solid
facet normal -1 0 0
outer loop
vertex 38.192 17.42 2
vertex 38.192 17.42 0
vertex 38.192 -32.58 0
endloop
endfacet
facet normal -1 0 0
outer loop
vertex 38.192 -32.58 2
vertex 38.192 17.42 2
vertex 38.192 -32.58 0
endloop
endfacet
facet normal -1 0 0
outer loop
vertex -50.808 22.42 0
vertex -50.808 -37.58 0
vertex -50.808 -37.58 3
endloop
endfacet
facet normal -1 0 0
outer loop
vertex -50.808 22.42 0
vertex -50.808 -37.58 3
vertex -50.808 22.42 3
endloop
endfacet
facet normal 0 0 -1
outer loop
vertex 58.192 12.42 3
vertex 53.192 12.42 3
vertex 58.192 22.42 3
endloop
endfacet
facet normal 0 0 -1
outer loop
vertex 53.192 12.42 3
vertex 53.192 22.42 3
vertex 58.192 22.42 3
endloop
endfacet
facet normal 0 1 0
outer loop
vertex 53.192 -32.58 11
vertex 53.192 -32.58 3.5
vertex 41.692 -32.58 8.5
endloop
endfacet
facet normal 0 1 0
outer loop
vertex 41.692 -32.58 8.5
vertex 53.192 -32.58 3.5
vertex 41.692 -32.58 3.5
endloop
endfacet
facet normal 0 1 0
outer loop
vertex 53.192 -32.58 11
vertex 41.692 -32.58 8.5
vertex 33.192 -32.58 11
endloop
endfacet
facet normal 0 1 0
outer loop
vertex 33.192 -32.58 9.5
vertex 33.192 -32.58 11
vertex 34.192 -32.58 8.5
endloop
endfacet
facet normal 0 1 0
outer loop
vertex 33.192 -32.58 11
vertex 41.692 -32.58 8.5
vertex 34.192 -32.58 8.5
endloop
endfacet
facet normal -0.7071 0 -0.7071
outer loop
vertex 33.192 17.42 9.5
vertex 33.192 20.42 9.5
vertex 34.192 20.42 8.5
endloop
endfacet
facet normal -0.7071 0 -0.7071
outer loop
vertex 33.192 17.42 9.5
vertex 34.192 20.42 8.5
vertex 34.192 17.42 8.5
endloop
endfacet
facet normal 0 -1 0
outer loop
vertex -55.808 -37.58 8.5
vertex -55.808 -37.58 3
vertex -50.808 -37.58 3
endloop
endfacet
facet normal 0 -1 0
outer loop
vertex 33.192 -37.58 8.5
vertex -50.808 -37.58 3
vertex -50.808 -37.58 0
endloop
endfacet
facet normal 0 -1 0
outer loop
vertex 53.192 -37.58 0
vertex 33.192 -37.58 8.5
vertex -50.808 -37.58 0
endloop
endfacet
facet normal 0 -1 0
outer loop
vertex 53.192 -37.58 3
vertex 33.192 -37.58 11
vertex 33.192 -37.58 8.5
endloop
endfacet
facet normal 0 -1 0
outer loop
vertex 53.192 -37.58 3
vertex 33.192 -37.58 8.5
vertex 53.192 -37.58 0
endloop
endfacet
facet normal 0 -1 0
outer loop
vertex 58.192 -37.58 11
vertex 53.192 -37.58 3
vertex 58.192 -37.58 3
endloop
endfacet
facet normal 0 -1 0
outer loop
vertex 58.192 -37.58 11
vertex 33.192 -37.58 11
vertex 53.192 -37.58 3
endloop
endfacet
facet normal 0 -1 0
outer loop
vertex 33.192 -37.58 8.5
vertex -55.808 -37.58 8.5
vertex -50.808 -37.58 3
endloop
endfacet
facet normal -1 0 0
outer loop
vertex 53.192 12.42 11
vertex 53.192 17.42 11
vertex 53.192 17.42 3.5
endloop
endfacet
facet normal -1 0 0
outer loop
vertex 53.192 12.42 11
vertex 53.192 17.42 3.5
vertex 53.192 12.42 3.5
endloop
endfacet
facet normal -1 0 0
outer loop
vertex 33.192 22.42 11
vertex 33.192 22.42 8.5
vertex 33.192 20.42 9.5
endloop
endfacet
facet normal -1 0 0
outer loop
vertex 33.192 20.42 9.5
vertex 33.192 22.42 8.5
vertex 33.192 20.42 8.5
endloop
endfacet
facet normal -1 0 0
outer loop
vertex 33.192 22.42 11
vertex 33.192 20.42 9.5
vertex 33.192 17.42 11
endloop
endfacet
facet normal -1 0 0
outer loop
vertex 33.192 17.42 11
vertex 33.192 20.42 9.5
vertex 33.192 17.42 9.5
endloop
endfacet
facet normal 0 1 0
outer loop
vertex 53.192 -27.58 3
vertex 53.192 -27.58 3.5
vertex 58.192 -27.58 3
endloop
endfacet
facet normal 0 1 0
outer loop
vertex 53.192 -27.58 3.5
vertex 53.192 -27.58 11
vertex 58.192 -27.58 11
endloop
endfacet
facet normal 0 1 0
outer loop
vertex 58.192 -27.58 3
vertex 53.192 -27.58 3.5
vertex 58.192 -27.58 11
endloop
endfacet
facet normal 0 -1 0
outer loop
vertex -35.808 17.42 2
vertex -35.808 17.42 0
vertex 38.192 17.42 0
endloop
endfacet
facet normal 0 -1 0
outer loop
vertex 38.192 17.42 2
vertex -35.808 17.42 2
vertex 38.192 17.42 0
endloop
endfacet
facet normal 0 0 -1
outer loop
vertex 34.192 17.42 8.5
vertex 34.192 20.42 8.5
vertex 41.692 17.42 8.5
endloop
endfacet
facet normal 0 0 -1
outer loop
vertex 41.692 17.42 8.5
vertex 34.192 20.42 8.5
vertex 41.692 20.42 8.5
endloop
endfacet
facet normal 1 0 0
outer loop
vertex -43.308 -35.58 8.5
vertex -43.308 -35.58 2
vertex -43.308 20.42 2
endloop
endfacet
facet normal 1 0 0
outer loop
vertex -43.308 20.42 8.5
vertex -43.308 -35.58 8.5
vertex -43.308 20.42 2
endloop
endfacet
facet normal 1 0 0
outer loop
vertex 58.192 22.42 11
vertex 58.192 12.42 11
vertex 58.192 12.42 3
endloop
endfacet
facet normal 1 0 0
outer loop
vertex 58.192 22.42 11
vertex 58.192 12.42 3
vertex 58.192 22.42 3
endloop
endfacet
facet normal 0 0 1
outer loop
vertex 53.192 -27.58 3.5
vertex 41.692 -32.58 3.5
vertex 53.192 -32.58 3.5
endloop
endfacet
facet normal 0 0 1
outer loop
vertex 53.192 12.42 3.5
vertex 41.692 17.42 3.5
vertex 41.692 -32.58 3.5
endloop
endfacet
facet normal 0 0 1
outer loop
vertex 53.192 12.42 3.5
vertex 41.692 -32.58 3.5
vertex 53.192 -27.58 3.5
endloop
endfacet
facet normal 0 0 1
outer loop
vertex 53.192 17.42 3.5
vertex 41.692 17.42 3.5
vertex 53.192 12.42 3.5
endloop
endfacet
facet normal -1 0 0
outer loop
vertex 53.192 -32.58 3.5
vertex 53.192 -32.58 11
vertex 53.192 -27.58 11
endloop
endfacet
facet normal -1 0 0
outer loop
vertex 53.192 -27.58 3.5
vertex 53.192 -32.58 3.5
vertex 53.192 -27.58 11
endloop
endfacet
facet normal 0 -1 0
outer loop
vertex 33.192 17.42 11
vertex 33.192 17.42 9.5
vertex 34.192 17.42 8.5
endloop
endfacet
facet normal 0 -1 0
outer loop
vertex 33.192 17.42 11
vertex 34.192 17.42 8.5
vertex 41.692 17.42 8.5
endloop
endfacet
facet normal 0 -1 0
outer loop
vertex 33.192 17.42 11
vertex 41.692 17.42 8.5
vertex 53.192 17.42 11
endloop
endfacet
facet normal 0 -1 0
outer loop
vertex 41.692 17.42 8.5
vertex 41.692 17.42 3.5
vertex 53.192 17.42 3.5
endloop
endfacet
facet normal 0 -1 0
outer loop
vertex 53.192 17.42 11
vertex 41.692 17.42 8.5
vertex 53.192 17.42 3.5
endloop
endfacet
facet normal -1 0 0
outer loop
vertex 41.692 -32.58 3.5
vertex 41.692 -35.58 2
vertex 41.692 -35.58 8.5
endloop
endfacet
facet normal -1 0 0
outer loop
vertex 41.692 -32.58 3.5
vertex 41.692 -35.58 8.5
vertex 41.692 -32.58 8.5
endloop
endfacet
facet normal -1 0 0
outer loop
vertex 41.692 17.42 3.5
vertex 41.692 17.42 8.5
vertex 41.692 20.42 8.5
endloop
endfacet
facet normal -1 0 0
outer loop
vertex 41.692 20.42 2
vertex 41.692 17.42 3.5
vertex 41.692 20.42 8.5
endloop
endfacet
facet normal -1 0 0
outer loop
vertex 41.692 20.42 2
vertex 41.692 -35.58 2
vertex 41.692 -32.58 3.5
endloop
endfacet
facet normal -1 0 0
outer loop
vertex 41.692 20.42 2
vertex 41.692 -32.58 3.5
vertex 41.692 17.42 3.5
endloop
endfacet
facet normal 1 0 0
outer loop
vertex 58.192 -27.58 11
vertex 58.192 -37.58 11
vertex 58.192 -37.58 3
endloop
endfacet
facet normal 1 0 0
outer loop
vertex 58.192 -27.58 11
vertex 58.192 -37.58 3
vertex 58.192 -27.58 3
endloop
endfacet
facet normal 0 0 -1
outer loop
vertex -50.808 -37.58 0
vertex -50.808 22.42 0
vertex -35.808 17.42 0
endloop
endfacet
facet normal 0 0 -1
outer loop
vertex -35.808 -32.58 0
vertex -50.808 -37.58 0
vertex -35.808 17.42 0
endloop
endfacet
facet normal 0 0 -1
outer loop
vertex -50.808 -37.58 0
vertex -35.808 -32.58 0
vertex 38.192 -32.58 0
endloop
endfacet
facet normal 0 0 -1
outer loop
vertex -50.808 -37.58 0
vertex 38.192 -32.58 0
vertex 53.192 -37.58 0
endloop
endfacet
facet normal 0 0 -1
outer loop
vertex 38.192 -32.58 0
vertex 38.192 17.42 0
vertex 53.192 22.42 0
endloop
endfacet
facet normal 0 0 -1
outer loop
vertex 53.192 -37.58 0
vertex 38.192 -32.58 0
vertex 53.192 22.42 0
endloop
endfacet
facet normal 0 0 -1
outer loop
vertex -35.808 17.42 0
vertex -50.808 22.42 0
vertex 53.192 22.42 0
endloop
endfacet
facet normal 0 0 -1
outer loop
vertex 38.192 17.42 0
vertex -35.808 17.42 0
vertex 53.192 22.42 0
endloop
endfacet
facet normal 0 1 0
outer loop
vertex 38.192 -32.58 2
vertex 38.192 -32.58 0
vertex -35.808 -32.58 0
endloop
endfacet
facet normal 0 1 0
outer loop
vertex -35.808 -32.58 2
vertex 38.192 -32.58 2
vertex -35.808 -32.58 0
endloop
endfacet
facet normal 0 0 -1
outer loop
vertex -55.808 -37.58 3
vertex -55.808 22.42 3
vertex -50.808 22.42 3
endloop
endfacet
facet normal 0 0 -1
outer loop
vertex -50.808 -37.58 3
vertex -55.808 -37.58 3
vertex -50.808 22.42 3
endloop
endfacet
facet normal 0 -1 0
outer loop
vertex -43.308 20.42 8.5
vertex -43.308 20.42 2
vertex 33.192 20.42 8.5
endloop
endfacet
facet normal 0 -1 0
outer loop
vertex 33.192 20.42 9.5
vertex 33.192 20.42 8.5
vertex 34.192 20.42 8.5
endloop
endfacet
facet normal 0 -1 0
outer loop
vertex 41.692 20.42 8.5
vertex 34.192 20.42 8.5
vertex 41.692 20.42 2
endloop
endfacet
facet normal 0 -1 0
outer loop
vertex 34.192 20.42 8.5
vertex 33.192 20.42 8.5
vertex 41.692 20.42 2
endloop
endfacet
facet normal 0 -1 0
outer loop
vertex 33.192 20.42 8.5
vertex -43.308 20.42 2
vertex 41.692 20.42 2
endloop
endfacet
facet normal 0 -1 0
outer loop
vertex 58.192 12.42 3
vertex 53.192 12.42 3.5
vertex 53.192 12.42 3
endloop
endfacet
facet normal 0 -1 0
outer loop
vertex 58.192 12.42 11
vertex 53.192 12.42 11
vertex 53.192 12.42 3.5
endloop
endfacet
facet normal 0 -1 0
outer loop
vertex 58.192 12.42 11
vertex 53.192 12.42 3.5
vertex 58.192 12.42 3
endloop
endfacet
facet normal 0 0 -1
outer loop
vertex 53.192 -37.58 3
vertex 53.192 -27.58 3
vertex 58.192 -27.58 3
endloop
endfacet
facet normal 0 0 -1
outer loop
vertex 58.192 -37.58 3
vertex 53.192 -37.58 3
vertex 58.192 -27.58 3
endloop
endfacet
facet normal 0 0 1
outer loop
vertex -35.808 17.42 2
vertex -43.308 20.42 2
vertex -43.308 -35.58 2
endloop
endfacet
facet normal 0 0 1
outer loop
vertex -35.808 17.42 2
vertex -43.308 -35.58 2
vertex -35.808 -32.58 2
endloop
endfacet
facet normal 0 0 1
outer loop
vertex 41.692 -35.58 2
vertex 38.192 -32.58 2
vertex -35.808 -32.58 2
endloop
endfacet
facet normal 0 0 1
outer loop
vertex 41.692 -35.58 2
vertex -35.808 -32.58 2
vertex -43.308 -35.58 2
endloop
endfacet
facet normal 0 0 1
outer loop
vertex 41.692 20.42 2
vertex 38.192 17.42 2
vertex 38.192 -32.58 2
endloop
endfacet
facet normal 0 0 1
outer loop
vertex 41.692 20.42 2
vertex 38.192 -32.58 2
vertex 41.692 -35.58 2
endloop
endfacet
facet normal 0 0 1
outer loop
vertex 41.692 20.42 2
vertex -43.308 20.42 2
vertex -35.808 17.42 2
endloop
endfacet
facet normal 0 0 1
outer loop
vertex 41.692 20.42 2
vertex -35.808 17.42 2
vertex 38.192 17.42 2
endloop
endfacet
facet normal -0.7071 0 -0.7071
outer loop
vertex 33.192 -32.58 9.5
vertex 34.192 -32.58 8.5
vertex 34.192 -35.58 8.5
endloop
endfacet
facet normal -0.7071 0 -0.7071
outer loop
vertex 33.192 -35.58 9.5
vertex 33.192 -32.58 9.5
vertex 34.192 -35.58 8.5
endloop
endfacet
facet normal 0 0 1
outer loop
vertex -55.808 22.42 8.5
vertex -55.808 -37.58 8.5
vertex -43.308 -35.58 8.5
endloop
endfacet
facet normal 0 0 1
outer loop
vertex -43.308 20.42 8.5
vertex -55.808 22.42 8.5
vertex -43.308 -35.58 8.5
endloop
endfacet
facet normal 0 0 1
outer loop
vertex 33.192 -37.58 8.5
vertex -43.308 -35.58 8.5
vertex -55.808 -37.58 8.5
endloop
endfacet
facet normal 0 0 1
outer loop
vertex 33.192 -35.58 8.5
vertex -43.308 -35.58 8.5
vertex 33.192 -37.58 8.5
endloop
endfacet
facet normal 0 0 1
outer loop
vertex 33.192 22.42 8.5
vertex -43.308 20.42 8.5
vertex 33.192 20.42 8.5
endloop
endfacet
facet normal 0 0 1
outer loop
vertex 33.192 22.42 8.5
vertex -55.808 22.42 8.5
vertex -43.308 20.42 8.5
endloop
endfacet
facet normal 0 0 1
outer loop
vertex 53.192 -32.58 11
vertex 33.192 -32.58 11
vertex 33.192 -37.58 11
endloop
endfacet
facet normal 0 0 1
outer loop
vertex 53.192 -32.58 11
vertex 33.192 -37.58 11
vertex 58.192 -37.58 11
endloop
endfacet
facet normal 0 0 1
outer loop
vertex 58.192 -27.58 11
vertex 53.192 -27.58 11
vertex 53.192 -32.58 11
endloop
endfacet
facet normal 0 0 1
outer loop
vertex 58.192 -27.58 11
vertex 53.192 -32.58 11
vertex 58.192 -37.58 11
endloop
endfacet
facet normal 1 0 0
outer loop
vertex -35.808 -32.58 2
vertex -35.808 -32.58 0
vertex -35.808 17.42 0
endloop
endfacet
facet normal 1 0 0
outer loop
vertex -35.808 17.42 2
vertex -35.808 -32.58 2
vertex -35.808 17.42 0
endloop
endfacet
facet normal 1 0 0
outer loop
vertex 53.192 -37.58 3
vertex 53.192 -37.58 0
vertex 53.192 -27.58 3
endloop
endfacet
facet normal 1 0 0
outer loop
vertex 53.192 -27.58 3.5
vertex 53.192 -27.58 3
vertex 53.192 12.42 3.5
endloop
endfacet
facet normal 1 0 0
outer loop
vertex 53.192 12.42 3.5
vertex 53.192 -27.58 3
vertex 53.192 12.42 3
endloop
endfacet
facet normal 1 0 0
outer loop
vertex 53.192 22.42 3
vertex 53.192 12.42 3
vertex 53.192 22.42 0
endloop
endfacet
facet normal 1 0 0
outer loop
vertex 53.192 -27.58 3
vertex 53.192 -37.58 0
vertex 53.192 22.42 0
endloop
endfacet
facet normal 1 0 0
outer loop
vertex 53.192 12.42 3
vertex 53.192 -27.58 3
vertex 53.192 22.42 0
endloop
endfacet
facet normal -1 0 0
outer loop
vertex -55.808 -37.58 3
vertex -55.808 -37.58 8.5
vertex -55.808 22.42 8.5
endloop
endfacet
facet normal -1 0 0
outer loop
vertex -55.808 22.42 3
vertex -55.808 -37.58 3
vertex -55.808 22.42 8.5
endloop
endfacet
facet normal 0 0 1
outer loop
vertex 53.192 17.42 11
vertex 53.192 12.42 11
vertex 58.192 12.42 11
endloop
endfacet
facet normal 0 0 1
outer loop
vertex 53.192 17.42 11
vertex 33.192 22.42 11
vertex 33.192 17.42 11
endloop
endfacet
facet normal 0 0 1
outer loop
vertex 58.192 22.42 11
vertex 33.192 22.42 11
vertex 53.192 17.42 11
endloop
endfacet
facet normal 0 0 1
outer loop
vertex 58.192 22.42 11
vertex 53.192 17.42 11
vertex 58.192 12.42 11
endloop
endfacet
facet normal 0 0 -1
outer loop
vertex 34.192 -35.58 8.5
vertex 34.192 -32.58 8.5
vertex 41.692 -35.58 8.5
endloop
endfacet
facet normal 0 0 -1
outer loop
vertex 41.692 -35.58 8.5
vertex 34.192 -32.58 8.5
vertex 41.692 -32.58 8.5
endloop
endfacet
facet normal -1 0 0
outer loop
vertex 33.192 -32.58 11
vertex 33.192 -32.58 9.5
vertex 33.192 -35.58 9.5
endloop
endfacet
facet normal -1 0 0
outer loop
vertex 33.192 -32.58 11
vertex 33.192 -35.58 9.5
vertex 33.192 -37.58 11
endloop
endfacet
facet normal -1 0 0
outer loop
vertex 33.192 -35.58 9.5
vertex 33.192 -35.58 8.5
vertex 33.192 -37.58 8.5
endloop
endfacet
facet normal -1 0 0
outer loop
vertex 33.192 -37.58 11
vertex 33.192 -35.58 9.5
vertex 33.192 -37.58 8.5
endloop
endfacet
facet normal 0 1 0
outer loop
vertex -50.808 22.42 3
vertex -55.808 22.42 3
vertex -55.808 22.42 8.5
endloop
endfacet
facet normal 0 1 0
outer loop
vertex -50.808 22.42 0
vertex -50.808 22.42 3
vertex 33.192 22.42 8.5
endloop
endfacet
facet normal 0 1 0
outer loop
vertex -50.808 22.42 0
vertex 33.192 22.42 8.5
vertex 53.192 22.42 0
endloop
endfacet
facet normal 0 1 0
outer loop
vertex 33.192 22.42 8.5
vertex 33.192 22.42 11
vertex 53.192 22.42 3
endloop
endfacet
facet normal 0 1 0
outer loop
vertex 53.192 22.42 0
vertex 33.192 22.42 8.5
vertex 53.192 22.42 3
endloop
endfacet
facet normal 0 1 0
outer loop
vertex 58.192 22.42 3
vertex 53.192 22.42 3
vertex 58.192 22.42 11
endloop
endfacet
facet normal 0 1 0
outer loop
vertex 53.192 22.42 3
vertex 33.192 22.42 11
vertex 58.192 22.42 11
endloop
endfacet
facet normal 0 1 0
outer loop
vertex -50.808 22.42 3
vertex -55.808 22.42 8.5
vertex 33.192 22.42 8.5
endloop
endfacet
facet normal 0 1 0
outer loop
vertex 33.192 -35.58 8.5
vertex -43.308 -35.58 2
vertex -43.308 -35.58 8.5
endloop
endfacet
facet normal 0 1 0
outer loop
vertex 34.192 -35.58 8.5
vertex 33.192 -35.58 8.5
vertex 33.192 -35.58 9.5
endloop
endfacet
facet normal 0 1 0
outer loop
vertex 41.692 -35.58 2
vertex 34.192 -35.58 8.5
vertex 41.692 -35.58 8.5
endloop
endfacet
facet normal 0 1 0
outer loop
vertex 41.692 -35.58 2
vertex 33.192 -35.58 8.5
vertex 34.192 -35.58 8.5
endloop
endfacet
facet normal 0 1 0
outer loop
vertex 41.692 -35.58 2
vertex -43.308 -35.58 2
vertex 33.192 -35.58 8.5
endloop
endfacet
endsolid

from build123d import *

# Parameters (mm, degrees)
F0_W      = 104
F0_H      = 60
F0_W_2    = 85
F0_H_2    = 56
F1_DEPTH  = 8.5
F2_DEPTH  = 2
F3_W      = 8.5
F3_H      = 3
F4_DEPTH  = 2.5
F5_SIZE   = 1
F6_DEPTH  = 5
F7_W      = 5
F7_H      = 10
F8_DEPTH  = 8
F9_W      = 5
F9_H      = 60
F10_DEPTH = 5.5


with BuildPart() as f1:
    # F0 (on Top) → F1 (new body)
    with BuildSketch(Plane.XY):
        with Locations((1.1924776137, -7.5798341542)):
            Rectangle(F0_W, F0_H)
        with Locations((-0.8075223863, -7.5798341542)):
            Rectangle(F0_W_2, F0_H_2, mode=Mode.SUBTRACT)
    extrude(amount=F1_DEPTH)

    # F0 (on Top) → F2 (join)
    with BuildSketch(Plane.XY):
        with Locations((-0.8075223863, -7.5798341542)):
            Rectangle(F0_W_2, F0_H_2)
        Polygon((-35.8075223863, -32.5798341542), (-35.8075223863, 17.4201658458), (34.1924776137, 17.4201658458), (38.1924776137, 17.4201658458), (38.1924776137, -32.5798341542), align=None, mode=Mode.SUBTRACT)
    extrude(amount=F2_DEPTH)

    # F3 (on face) → F4 (join)
    with BuildSketch(Plane.XY.offset(8.5)):
        with Locations((37.4424776137, -34.0798341542)):
            Rectangle(F3_W, F3_H)
        with Locations((37.4424776137, 18.9201658458)):
            Rectangle(F3_W, F3_H)
        Polygon((33.1924776137, -37.5798341542), (53.1924776137, -37.5798341542), (53.1924776137, -32.5798341542), (41.6924776137, -32.5798341542), (41.6924776137, -35.5798341542), (33.1924776137, -35.5798341542), align=None)
        Polygon((41.6924776137, 17.4201658458), (53.1924776137, 17.4201658458), (53.1924776137, 22.4201658458), (33.1924776137, 22.4201658458), (33.1924776137, 20.4201658458), (41.6924776137, 20.4201658458), align=None)
    extrude(amount=F4_DEPTH)

    # F5
    f5_edges = [f1.edges().sort_by_distance(p)[0] for p in [
        (33.192478, 18.920166, 8.5),
        (33.192478, -34.079834, 8.5),
    ]]
    chamfer(f5_edges, length=F5_SIZE)

    # F6 (cut): a face of the model
    f6_faces = [f1.faces().sort_by_distance(p)[0] for p in [
        (47.4424776137, -7.5798341542, 8.5),
    ]]
    extrude(f6_faces, amount=-F6_DEPTH, mode=Mode.SUBTRACT)

    # F7 (on face) → F8 (join)
    with BuildSketch(Plane.XY.offset(11)):
        Polygon((53.1924776137, 17.4201658458), (53.1924776137, 12.4201658458), (58.1924776137, 12.4201658458), (58.1924776137, 22.4201658458), (53.1924776137, 22.4201658458), align=None)
        with Locations((55.6924776137, -32.5798341542)):
            Rectangle(F7_W, F7_H)
    extrude(amount=-F8_DEPTH)

    # F9 (on face) → F10 (join)
    with BuildSketch(Plane.XY.offset(8.5)):
        with Locations((-53.3075223863, -7.5798341542)):
            Rectangle(F9_W, F9_H)
    extrude(amount=-F10_DEPTH)


solid = f1.part
